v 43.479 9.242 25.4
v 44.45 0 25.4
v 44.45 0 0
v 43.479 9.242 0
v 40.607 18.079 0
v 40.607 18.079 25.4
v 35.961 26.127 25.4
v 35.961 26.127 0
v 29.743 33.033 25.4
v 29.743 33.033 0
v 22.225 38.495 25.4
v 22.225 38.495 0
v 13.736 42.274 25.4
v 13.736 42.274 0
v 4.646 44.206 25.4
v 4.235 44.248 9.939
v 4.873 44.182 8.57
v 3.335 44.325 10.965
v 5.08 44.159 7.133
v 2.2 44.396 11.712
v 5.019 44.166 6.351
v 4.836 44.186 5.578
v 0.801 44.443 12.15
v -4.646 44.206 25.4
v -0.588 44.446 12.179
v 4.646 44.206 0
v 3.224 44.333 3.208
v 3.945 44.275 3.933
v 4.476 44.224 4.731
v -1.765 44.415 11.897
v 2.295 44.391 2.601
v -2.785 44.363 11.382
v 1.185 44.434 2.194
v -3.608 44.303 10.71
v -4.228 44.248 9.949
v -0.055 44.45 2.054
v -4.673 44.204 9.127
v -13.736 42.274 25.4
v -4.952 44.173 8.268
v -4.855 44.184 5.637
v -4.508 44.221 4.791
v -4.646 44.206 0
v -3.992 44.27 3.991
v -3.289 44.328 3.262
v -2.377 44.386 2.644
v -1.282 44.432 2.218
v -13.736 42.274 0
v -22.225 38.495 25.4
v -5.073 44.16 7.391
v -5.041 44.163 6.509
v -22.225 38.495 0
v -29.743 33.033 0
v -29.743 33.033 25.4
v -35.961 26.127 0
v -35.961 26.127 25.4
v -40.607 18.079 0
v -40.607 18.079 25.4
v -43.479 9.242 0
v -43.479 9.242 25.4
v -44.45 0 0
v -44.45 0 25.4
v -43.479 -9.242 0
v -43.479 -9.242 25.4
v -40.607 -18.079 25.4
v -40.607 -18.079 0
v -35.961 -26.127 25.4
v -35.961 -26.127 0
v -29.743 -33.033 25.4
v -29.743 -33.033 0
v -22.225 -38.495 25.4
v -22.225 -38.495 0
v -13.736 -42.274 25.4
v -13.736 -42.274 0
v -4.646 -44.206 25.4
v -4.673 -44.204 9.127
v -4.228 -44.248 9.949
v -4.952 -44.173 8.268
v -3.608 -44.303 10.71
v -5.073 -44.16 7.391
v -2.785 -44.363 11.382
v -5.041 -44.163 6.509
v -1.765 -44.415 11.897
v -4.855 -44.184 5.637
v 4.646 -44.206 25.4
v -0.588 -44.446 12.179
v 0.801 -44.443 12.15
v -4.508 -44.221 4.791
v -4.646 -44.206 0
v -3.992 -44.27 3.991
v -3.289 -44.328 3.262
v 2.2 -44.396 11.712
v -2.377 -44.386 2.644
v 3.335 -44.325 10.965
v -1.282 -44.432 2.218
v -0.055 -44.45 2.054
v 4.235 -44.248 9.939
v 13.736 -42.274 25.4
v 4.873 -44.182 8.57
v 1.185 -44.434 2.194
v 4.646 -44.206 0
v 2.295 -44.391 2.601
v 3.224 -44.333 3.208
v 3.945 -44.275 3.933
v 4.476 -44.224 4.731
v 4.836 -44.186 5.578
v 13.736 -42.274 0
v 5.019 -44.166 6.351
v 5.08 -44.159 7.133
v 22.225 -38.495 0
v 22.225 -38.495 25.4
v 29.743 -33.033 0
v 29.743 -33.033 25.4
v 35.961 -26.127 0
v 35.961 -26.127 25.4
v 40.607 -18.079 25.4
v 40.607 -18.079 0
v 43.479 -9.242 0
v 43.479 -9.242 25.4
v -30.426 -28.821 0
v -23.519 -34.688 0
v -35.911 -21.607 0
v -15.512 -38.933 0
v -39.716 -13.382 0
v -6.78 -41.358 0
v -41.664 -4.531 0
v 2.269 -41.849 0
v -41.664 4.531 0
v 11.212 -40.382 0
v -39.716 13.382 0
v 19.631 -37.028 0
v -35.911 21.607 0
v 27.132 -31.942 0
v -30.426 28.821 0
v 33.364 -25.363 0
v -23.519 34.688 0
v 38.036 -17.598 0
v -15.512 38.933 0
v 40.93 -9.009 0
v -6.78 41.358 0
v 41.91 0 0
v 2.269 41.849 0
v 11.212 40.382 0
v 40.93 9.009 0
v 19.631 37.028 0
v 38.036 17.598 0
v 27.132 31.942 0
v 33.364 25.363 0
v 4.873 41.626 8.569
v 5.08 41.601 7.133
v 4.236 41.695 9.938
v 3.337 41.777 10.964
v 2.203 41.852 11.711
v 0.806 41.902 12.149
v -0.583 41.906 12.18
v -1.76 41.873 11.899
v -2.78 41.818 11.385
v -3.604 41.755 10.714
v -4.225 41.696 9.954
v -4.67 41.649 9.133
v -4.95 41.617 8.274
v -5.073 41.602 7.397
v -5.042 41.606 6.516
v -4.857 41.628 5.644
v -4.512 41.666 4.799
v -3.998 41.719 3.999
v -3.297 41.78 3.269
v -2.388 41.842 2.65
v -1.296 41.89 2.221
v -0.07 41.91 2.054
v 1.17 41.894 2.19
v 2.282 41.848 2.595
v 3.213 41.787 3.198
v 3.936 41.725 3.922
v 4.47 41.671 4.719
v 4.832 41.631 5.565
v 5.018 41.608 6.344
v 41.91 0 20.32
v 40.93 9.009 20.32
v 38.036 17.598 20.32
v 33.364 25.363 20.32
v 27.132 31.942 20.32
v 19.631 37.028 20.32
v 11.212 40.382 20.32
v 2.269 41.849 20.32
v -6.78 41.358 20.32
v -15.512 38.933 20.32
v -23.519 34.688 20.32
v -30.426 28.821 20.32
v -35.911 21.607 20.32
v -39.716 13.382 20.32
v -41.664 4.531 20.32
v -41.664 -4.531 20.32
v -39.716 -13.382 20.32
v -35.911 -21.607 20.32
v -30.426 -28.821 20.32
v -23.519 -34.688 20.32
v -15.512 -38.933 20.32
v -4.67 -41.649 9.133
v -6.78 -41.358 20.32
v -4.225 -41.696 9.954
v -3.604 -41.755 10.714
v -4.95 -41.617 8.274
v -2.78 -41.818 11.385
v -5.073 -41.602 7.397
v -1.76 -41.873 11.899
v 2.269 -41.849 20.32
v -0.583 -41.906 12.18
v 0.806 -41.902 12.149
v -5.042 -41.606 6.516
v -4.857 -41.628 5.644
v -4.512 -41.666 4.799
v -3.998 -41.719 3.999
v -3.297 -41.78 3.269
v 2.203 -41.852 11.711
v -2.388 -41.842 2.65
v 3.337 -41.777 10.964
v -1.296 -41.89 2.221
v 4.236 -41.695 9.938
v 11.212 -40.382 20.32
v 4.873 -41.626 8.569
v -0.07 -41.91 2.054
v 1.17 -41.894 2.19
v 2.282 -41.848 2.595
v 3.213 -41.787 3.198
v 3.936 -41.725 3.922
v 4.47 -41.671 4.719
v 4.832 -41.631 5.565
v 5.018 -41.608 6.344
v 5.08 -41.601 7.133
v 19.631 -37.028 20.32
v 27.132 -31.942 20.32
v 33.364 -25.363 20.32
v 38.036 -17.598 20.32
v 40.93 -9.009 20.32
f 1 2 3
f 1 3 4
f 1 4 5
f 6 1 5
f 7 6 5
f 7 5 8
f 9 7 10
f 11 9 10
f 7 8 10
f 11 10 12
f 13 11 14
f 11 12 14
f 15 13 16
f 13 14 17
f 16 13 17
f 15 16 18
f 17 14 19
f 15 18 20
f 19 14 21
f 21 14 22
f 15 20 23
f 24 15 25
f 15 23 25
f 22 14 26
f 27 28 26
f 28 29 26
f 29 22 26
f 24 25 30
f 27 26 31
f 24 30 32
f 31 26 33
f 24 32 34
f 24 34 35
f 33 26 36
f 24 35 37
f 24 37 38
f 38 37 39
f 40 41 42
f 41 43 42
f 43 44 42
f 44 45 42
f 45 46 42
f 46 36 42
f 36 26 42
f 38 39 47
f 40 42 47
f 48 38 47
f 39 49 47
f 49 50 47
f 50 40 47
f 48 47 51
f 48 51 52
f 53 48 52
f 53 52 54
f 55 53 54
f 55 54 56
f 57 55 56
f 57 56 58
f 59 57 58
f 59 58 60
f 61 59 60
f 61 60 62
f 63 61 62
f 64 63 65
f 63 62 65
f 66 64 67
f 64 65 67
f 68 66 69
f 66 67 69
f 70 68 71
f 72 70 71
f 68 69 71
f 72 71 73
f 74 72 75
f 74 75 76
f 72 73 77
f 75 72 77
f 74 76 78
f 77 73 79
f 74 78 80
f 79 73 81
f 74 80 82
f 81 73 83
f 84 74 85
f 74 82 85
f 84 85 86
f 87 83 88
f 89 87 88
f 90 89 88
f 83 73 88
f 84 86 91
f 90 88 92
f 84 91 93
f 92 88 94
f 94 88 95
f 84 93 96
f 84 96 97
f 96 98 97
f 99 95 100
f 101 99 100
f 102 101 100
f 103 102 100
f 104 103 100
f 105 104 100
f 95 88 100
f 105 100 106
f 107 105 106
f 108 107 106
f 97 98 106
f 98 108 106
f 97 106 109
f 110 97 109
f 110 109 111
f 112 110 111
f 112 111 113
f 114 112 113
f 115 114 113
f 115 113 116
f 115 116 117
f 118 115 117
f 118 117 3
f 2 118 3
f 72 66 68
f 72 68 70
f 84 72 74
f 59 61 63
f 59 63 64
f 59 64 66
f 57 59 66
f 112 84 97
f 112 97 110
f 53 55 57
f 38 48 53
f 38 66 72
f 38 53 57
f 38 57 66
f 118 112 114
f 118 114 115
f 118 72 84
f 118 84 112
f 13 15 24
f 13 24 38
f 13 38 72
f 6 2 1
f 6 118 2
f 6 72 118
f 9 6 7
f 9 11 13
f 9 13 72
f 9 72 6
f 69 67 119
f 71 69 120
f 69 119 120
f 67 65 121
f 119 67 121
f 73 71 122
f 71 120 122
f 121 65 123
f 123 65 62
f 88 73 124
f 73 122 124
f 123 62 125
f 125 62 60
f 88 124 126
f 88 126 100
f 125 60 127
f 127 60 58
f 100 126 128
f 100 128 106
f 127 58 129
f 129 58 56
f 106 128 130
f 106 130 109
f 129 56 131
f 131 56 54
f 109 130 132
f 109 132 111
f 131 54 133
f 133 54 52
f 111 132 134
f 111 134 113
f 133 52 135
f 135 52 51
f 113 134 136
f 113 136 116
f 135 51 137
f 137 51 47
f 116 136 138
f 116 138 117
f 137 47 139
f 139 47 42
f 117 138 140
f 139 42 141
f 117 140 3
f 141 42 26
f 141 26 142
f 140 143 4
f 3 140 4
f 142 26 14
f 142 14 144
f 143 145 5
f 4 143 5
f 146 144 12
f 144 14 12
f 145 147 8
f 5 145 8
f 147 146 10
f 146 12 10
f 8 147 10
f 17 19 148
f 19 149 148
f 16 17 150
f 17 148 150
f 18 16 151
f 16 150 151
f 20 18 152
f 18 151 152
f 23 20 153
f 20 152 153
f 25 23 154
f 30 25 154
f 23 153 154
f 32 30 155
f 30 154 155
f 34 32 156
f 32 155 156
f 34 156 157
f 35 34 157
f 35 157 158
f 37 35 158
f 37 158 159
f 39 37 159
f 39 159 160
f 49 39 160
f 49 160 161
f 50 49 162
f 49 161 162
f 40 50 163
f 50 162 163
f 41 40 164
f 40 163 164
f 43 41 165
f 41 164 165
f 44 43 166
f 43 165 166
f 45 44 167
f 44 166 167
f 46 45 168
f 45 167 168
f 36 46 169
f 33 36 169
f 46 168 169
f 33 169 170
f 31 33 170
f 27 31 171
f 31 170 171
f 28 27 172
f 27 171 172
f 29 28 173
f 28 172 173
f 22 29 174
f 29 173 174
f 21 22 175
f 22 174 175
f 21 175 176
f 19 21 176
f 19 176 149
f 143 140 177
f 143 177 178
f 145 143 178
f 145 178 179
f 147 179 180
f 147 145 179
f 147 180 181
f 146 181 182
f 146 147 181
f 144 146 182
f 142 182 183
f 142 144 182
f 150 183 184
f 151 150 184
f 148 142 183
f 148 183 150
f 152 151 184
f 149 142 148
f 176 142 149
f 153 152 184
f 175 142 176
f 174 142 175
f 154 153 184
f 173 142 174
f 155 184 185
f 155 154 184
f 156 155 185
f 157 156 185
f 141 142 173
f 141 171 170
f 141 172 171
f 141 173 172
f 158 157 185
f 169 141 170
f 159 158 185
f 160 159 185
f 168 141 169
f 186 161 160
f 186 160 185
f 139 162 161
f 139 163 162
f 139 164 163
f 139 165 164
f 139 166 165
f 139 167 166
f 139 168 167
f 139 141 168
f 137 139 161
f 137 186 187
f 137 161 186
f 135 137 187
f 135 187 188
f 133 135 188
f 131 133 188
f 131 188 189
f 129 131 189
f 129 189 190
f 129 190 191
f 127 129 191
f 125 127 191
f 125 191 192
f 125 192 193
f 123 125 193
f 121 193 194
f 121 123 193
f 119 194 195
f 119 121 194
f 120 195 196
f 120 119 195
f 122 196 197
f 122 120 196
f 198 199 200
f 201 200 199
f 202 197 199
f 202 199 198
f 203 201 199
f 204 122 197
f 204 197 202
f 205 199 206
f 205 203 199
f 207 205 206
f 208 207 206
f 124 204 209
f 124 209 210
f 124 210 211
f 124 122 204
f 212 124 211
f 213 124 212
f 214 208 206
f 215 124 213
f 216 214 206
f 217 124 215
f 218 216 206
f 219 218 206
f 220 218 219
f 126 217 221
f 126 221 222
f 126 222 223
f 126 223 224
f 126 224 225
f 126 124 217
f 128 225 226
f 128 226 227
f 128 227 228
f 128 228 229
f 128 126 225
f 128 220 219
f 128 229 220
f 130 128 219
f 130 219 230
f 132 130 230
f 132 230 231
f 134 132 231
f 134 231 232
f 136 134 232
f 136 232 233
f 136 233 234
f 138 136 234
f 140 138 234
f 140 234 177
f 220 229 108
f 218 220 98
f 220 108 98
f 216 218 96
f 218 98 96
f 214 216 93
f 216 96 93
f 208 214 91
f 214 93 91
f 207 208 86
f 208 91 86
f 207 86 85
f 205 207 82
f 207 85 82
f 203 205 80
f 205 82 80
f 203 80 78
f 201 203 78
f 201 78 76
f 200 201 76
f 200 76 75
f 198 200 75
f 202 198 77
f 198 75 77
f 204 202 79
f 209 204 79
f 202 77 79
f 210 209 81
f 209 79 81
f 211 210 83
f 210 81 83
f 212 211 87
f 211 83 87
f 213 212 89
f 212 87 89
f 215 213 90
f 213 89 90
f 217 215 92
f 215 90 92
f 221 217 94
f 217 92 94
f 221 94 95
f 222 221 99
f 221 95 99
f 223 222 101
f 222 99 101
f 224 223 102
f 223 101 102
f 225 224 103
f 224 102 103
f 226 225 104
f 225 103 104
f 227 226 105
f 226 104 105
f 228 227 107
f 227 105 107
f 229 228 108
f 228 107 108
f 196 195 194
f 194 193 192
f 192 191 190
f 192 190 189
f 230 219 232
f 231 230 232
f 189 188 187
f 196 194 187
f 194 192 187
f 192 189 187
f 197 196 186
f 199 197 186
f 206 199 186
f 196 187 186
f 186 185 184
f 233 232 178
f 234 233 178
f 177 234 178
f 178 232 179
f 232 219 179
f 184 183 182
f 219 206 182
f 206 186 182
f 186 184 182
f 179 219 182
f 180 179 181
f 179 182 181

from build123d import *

# Parameters (mm, degrees)
F0_R     = 44.45
F0_R_2   = 41.91
F1_DEPTH = 25.4
F2_R     = 41.91
F2_R_2   = 38.1
F3_DEPTH = 5.08
F4_R     = 5.08
F5_DEPTH = 56.642


with BuildPart() as f1:
    # F0 (on Top) → F1 (new body)
    with BuildSketch(Plane.XY):
        Circle(F0_R)
        Circle(F0_R_2, mode=Mode.SUBTRACT)
    extrude(amount=F1_DEPTH)

    # F2 (on face) → F3 (join)
    with BuildSketch(Plane.XY.offset(25.4)):
        Circle(F2_R)
        Circle(F2_R_2, mode=Mode.SUBTRACT)
        Circle(F2_R_2)
    extrude(amount=-F3_DEPTH)

    # F4 (on Front) → F5 (cut, symmetric)
    with BuildSketch(Plane.XZ):
        with Locations((0, 7.133455)):
            Circle(F4_R)
    extrude(amount=F5_DEPTH, both=True, mode=Mode.SUBTRACT)


solid = f1.part
